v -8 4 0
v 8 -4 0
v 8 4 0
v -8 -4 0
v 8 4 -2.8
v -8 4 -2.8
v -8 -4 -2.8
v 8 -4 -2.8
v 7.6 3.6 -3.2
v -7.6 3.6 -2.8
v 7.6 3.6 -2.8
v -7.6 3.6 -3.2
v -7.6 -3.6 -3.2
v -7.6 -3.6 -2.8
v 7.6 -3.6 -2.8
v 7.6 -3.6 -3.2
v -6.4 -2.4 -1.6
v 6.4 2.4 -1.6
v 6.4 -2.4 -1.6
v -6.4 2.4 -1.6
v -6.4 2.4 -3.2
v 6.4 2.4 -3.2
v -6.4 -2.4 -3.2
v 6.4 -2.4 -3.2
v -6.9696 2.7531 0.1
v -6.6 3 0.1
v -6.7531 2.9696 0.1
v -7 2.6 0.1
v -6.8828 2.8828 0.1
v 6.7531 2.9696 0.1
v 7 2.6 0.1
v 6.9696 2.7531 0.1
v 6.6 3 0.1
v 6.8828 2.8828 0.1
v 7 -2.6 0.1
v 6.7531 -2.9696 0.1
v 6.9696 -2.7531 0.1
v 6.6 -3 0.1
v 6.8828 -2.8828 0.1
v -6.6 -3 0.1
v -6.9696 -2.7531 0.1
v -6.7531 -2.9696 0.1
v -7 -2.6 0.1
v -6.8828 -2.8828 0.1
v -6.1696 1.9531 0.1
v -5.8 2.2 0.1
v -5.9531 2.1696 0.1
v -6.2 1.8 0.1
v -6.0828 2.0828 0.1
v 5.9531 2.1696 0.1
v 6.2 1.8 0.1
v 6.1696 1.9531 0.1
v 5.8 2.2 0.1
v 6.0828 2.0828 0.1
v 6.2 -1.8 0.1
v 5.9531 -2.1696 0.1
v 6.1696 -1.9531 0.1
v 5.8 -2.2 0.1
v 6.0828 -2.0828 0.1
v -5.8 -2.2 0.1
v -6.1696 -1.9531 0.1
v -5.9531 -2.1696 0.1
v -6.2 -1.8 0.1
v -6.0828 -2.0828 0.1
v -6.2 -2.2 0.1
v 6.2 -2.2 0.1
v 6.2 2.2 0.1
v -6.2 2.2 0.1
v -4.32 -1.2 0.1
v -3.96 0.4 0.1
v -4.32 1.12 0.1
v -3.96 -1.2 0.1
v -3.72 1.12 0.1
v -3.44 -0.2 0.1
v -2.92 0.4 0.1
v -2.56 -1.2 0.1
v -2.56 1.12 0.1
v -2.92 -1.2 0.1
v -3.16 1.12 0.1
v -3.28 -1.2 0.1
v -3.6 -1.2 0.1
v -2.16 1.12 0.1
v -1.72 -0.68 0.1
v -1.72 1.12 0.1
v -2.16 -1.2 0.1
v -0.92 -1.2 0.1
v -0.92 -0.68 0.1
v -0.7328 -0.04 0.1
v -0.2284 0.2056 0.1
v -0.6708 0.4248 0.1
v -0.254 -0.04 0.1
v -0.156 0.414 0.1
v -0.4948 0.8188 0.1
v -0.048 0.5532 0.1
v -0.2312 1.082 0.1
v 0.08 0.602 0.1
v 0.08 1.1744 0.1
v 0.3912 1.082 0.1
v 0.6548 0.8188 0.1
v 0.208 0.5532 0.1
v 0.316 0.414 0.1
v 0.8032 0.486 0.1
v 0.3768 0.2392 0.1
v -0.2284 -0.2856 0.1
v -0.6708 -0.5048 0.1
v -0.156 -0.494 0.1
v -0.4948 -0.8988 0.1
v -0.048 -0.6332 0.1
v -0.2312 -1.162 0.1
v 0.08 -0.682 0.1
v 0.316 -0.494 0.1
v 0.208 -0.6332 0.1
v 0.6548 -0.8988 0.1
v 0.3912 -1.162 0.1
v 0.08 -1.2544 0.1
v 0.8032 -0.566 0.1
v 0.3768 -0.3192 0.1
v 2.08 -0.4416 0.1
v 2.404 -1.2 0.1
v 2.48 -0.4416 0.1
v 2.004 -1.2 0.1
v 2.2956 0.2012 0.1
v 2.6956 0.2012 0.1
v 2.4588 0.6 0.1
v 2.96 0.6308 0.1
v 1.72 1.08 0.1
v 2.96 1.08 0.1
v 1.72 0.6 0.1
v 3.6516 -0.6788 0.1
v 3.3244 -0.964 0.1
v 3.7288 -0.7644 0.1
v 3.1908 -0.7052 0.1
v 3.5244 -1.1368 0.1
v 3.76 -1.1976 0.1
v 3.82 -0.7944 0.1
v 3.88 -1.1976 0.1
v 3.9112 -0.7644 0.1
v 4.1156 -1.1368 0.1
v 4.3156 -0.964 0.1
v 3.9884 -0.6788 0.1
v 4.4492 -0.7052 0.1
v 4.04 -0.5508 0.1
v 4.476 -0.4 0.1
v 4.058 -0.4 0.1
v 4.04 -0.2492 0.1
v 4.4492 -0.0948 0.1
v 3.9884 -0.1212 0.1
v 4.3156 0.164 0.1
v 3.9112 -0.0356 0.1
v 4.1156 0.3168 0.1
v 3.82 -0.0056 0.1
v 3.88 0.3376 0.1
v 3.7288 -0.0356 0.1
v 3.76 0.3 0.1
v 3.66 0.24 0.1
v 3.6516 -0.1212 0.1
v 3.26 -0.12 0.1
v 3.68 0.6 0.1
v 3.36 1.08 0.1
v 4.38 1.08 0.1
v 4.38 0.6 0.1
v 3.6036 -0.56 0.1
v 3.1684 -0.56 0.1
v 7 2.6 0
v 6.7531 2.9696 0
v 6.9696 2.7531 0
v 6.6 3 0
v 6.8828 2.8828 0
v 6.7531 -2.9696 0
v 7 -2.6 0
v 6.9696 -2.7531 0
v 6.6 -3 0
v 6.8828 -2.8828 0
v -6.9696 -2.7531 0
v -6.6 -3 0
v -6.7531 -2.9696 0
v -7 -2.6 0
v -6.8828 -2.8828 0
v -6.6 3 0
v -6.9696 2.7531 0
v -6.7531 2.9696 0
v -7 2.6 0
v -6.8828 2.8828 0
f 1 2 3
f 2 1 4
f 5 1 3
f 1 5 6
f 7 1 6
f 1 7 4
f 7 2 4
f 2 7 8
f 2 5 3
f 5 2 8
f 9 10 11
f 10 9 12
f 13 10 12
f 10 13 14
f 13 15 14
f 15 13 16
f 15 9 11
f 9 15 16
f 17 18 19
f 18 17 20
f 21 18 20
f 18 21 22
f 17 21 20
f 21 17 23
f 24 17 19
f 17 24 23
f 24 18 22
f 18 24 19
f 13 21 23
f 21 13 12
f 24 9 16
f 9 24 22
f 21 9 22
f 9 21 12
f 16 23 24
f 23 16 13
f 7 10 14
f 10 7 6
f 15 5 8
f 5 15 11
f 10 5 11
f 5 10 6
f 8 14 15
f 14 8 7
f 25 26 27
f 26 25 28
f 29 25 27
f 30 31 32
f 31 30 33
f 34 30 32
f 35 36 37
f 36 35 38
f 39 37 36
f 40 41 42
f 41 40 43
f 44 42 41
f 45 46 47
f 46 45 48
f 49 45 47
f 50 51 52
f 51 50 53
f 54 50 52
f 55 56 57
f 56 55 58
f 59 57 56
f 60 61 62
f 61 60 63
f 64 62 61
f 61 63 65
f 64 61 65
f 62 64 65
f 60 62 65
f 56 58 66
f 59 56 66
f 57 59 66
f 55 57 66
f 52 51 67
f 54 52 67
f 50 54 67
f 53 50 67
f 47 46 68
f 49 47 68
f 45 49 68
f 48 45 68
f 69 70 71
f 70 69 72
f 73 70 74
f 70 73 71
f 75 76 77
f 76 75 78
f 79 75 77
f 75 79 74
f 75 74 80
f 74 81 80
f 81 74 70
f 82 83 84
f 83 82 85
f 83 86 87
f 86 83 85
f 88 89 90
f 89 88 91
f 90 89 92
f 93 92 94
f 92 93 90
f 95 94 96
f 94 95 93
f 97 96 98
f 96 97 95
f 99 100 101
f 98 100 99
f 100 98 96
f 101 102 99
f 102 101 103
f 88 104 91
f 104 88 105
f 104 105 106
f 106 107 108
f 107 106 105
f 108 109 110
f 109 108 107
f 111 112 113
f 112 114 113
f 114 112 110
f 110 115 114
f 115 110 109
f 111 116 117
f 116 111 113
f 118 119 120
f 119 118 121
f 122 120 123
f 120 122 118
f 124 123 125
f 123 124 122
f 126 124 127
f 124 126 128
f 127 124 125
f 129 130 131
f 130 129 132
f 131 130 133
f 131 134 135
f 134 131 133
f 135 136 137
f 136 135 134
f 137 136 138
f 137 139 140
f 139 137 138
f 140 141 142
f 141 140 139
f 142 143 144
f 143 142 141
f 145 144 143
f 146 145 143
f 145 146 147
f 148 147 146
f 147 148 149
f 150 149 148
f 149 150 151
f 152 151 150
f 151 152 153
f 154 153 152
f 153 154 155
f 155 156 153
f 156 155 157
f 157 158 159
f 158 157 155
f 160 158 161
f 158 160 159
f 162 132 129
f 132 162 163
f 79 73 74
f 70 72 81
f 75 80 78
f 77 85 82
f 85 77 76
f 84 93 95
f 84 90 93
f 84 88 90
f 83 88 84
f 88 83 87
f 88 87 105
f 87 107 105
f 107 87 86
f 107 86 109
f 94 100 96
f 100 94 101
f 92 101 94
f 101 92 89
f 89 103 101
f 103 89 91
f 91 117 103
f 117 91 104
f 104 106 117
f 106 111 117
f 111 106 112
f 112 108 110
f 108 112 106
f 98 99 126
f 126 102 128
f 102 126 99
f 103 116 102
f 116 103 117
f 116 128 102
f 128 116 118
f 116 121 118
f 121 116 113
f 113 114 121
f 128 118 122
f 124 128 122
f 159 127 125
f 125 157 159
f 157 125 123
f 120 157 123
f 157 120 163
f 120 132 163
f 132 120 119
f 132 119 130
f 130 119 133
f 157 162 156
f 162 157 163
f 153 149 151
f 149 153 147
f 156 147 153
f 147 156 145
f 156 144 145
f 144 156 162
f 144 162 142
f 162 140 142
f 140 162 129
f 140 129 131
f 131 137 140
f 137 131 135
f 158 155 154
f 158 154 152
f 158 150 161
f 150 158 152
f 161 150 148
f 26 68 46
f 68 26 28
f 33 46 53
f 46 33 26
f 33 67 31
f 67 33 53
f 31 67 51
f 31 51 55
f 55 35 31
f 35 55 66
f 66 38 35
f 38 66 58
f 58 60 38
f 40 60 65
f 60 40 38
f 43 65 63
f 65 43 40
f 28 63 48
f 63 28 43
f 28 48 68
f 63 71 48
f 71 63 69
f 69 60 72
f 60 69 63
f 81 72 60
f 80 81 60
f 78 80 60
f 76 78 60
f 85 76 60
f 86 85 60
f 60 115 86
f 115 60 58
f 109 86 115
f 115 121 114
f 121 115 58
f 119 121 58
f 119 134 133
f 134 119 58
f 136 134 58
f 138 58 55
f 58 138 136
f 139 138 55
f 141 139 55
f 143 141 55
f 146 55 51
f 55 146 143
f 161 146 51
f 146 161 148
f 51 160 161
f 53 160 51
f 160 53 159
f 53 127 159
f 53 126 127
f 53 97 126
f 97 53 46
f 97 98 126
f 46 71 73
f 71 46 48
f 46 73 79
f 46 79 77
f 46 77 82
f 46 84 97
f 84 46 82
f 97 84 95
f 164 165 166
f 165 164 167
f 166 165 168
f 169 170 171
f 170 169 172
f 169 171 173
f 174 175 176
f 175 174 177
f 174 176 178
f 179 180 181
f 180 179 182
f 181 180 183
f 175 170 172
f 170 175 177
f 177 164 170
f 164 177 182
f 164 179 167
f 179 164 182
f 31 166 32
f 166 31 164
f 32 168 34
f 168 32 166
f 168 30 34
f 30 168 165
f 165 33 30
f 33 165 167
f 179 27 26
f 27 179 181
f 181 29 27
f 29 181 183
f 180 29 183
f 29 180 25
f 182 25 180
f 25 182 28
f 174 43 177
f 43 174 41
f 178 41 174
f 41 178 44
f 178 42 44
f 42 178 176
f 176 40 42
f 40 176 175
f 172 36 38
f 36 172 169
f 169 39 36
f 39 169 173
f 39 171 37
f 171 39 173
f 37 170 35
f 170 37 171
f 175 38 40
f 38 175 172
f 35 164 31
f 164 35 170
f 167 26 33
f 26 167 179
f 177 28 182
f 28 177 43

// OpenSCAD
// file: ../p/box5.scad
use <../lib.scad>
function ldraw_lib__box5() = [
// 0 Box with 5 Faces and All Edges
// 0 Name: box5.dat
// 0 Author: James Jessiman
// 0 !LDRAW_ORG Primitive UPDATE 2012-01
// 0 !LICENSE Licensed under CC BY 4.0 : see CAreadme.txt
// 
// 0 BFC CERTIFY CCW
  [0,"BFC","CERTIFY"],
  [0,"BFC","CCW"],
// 
// 0 !HISTORY 2002-04-03 [sbliss] Modified for BFC compliance
// 0 !HISTORY 2002-04-25 [PTadmin] Official Update 2002-02
// 0 !HISTORY 2007-06-24 [PTadmin] Header formatted for Contributor Agreement
// 0 !HISTORY 2008-07-01 [PTadmin] Official Update 2008-01
// 0 !HISTORY 2012-02-16 [Philo] Changed to CCW
// 0 !HISTORY 2012-03-30 [PTadmin] Official Update 2012-01
// 
// 
// 2 24 1 1 1 -1 1 1
  [2,24,1,1,1,-1,1,1],
// 2 24 -1 1 1 -1 1 -1
  [2,24,-1,1,1,-1,1,-1],
// 2 24 -1 1 -1 1 1 -1
  [2,24,-1,1,-1,1,1,-1],
// 2 24 1 1 -1 1 1 1
  [2,24,1,1,-1,1,1,1],
// 2 24 1 0 1 -1 0 1
  [2,24,1,0,1,-1,0,1],
// 2 24 -1 0 1 -1 0 -1
  [2,24,-1,0,1,-1,0,-1],
// 2 24 -1 0 -1 1 0 -1
  [2,24,-1,0,-1,1,0,-1],
// 2 24 1 0 -1 1 0 1
  [2,24,1,0,-1,1,0,1],
// 2 24 1 0 1 1 1 1
  [2,24,1,0,1,1,1,1],
// 2 24 -1 0 1 -1 1 1
  [2,24,-1,0,1,-1,1,1],
// 2 24 1 0 -1 1 1 -1
  [2,24,1,0,-1,1,1,-1],
// 2 24 -1 0 -1 -1 1 -1
  [2,24,-1,0,-1,-1,1,-1],
// 4 16 -1 1 1 1 1 1 1 1 -1 -1 1 -1
  [4,16,-1,1,1,1,1,1,1,1,-1,-1,1,-1],
// 4 16 -1 1 1 -1 0 1 1 0 1 1 1 1
  [4,16,-1,1,1,-1,0,1,1,0,1,1,1,1],
// 4 16 -1 1 -1 -1 0 -1 -1 0 1 -1 1 1
  [4,16,-1,1,-1,-1,0,-1,-1,0,1,-1,1,1],
// 4 16 1 1 -1 1 0 -1 -1 0 -1 -1 1 -1
  [4,16,1,1,-1,1,0,-1,-1,0,-1,-1,1,-1],
// 4 16 1 1 1 1 0 1 1 0 -1 1 1 -1
  [4,16,1,1,1,1,0,1,1,0,-1,1,1,-1],
];
module ldraw_lib__box5(step=0, col=false, unit=2/5, alt=false, line=0.2, solid=!$preview)
    makepoly(ldraw_lib__box5(), step=step, col=col, unit=unit, alt=alt, line=line, solid=solid);
ldraw_lib__box5(line=0.2);
// file: ../p/box4.scad
use <../lib.scad>
function ldraw_lib__box4() = [
// 0 Box with 4 Faces (2 Parallel Pairs) and All Edges
// 0 Name: box4.dat
// 0 Author: James Jessiman
// 0 !LDRAW_ORG Primitive UPDATE 2012-01
// 0 !LICENSE Licensed under CC BY 4.0 : see CAreadme.txt
// 
// 0 BFC CERTIFY CCW
  [0,"BFC","CERTIFY"],
  [0,"BFC","CCW"],
// 
// 0 !HISTORY 2002-04-03 [sbliss] Modified for BFC compliance
// 0 !HISTORY 2002-04-25 [PTadmin] Official Update 2002-02
// 0 !HISTORY 2007-06-24 [PTadmin] Header formatted for Contributor Agreement
// 0 !HISTORY 2008-07-01 [PTadmin] Official Update 2008-01
// 0 !HISTORY 2012-02-16 [Philo] Changed to CCW
// 0 !HISTORY 2012-03-30 [PTadmin] Official Update 2012-01
// 
// 
// 2 24 1 1 1 -1 1 1
  [2,24,1,1,1,-1,1,1],
// 2 24 -1 1 1 -1 1 -1
  [2,24,-1,1,1,-1,1,-1],
// 2 24 -1 1 -1 1 1 -1
  [2,24,-1,1,-1,1,1,-1],
// 2 24 1 1 -1 1 1 1
  [2,24,1,1,-1,1,1,1],
// 2 24 1 0 1 -1 0 1
  [2,24,1,0,1,-1,0,1],
// 2 24 -1 0 1 -1 0 -1
  [2,24,-1,0,1,-1,0,-1],
// 2 24 -1 0 -1 1 0 -1
  [2,24,-1,0,-1,1,0,-1],
// 2 24 1 0 -1 1 0 1
  [2,24,1,0,-1,1,0,1],
// 2 24 1 0 1 1 1 1
  [2,24,1,0,1,1,1,1],
// 2 24 -1 0 1 -1 1 1
  [2,24,-1,0,1,-1,1,1],
// 2 24 1 0 -1 1 1 -1
  [2,24,1,0,-1,1,1,-1],
// 2 24 -1 0 -1 -1 1 -1
  [2,24,-1,0,-1,-1,1,-1],
// 4 16 -1 1 1 -1 0 1 1 0 1 1 1 1
  [4,16,-1,1,1,-1,0,1,1,0,1,1,1,1],
// 4 16 -1 1 -1 -1 0 -1 -1 0 1 -1 1 1
  [4,16,-1,1,-1,-1,0,-1,-1,0,1,-1,1,1],
// 4 16 1 1 -1 1 0 -1 -1 0 -1 -1 1 -1
  [4,16,1,1,-1,1,0,-1,-1,0,-1,-1,1,-1],
// 4 16 1 1 1 1 0 1 1 0 -1 1 1 -1
  [4,16,1,1,1,1,0,1,1,0,-1,1,1,-1],
];
module ldraw_lib__box4(step=0, col=false, unit=2/5, alt=false, line=0.2, solid=!$preview)
    makepoly(ldraw_lib__box4(), step=step, col=col, unit=unit, alt=alt, line=line, solid=solid);
ldraw_lib__box4(line=0.2);
// file: ../p/1-4ndis.scad
use <../lib.scad>
function ldraw_lib__1_4ndis() = [
// 0 Disc Negative 0.25
// 0 Name: 1-4ndis.dat
// 0 Author: James Jessiman
// 0 !LDRAW_ORG Primitive UPDATE 2012-01
// 0 !LICENSE Licensed under CC BY 4.0 : see CAreadme.txt
// 
// 0 BFC CERTIFY CCW
  [0,"BFC","CERTIFY"],
  [0,"BFC","CCW"],
// 
// 0 !HISTORY 2002-03-23 [sbliss] Added BFC Statement
// 0 !HISTORY 2002-04-25 [PTadmin] Official Update 2002-02
// 0 !HISTORY 2007-06-22 [PTadmin] Header formatted for Contributor Agreement
// 0 !HISTORY 2008-07-01 [PTadmin] Official Update 2008-01
// 0 !HISTORY 2012-02-16 [Philo] Changed to CCW
// 0 !HISTORY 2012-03-30 [PTadmin] Official Update 2012-01
// 
// 
// 3 16 0.9239 0 0.3827 1 0 0 1 0 1
  [3,16,0.9239,0,0.3827,1,0,0,1,0,1],
// 3 16 0.7071 0 0.7071 0.9239 0 0.3827 1 0 1
  [3,16,0.7071,0,0.7071,0.9239,0,0.3827,1,0,1],
// 3 16 0.3827 0 0.9239 0.7071 0 0.7071 1 0 1
  [3,16,0.3827,0,0.9239,0.7071,0,0.7071,1,0,1],
// 3 16 0 0 1 0.3827 0 0.9239 1 0 1
  [3,16,0,0,1,0.3827,0,0.9239,1,0,1],
];
module ldraw_lib__1_4ndis(step=0, col=false, unit=2/5, alt=false, line=0.2, solid=!$preview)
    makepoly(ldraw_lib__1_4ndis(), step=step, col=col, unit=unit, alt=alt, line=line, solid=solid);
ldraw_lib__1_4ndis(line=0.2);
// file: ../p/1-4cyli.scad
use <../lib.scad>
function ldraw_lib__1_4cyli() = [
// 0 Cylinder 0.25
// 0 Name: 1-4cyli.dat
// 0 Author: James Jessiman
// 0 !LDRAW_ORG Primitive UPDATE 2012-01
// 0 !LICENSE Licensed under CC BY 4.0 : see CAreadme.txt
// 
// 0 BFC CERTIFY CCW
  [0,"BFC","CERTIFY"],
  [0,"BFC","CCW"],
// 
// 0 !HISTORY 2002-03-23 [sbliss] Added BFC statement.
// 0 !HISTORY 2002-04-25 [PTadmin] Official Update 2002-02
// 0 !HISTORY 2007-06-22 [PTadmin] Header formatted for Contributor Agreement
// 0 !HISTORY 2008-07-01 [PTadmin] Official Update 2008-01
// 0 !HISTORY 2012-02-16 [Philo] Changed to CCW
// 0 !HISTORY 2012-03-30 [PTadmin] Official Update 2012-01
// 
// 
// 4 16 1 1 0 0.9239 1 0.3827 0.9239 0 0.3827 1 0 0
  [4,16,1,1,0,0.9239,1,0.3827,0.9239,0,0.3827,1,0,0],
// 5 24 1 0 0 1 1 0 0.9239 0 0.3827 1 0 -1
  [5,24,1,0,0,1,1,0,0.9239,0,0.3827,1,0,-1],
// 4 16 0.9239 1 0.3827 0.7071 1 0.7071 0.7071 0 0.7071 0.9239 0 0.3827
  [4,16,0.9239,1,0.3827,0.7071,1,0.7071,0.7071,0,0.7071,0.9239,0,0.3827],
// 5 24 0.9239 0 0.3827 0.9239 1 0.3827 0.7071 0 0.7071 1 0 0
  [5,24,0.9239,0,0.3827,0.9239,1,0.3827,0.7071,0,0.7071,1,0,0],
// 4 16 0.7071 1 0.7071 0.3827 1 0.9239 0.3827 0 0.9239 0.7071 0 0.7071
  [4,16,0.7071,1,0.7071,0.3827,1,0.9239,0.3827,0,0.9239,0.7071,0,0.7071],
// 5 24 0.7071 0 0.7071 0.7071 1 0.7071 0.3827 0 0.9239 0.9239 0 0.3827
  [5,24,0.7071,0,0.7071,0.7071,1,0.7071,0.3827,0,0.9239,0.9239,0,0.3827],
// 4 16 0.3827 1 0.9239 0 1 1 0 0 1 0.3827 0 0.9239
  [4,16,0.3827,1,0.9239,0,1,1,0,0,1,0.3827,0,0.9239],
// 5 24 0.3827 0 0.9239 0.3827 1 0.9239 0 0 1 0.7071 0 0.7071
  [5,24,0.3827,0,0.9239,0.3827,1,0.9239,0,0,1,0.7071,0,0.7071],
// 5 24 0 0 1 0 1 1 0.3827 0 0.9239 -1 0 1
  [5,24,0,0,1,0,1,1,0.3827,0,0.9239,-1,0,1],
];
module ldraw_lib__1_4cyli(step=0, col=false, unit=2/5, alt=false, line=0.2, solid=!$preview)
    makepoly(ldraw_lib__1_4cyli(), step=step, col=col, unit=unit, alt=alt, line=line, solid=solid);
ldraw_lib__1_4cyli(line=0.2);
// file: ../p/1-4chrd.scad
use <../lib.scad>
function ldraw_lib__1_4chrd() = [
// 0 Chord 0.25
// 0 Name: 1-4chrd.dat
// 0 Author: Max Martin Richter [MMR1988]
// 0 !LDRAW_ORG Primitive UPDATE 2023-05
// 0 !LICENSE Licensed under CC BY 4.0 : see CAreadme.txt
// 
// 0 BFC CERTIFY CCW
  [0,"BFC","CERTIFY"],
  [0,"BFC","CCW"],
// 
// 0 !HISTORY 2004-04-22 [PTadmin] Official Update 2004-02
// 0 !HISTORY 2007-10-09 [PTadmin] Header formatted for Contributor Agreement
// 0 !HISTORY 2008-07-01 [PTadmin] Official Update 2008-01
// 0 !HISTORY 2012-08-02 [MMR1988] Re-creation with PrimGen2 and Rectifier
// 0 !HISTORY 2012-08-09 [PTadmin] Official Update 2012-02
// 0 !HISTORY 2023-10-27 [OrionP] Change author to MMR1988 from hafhead
// 0 !HISTORY 2023-10-31 [OrionP] Official Update 2023-05
// 
// 4 16 0.9239 0 0.3827 0.3827 0 0.9239 0 0 1 1 0 0
  [4,16,0.9239,0,0.3827,0.3827,0,0.9239,0,0,1,1,0,0],
// 3 16 0.7071 0 0.7071 0.3827 0 0.9239 0.9239 0 0.3827
  [3,16,0.7071,0,0.7071,0.3827,0,0.9239,0.9239,0,0.3827],
];
module ldraw_lib__1_4chrd(step=0, col=false, unit=2/5, alt=false, line=0.2, solid=!$preview)
    makepoly(ldraw_lib__1_4chrd(), step=step, col=col, unit=unit, alt=alt, line=line, solid=solid);
ldraw_lib__1_4chrd(line=0.2);
// file: s/3069bs01.scad
use <../../lib.scad>
use <../../p/box4.scad>
use <../../p/box5.scad>
function ldraw_lib__s__3069bs01() = [
// 0 ~Tile  1 x  2 with Groove without Top Face
// 0 Name: s\3069bs01.dat
// 0 Author: Santeri Piippo [arezey]
// 0 !LDRAW_ORG Subpart UPDATE 2010-02
// 0 !LICENSE Licensed under CC BY 4.0 : see CAreadme.txt
// 
// 0 BFC CERTIFY CCW
  [0,"BFC","CERTIFY"],
  [0,"BFC","CCW"],
// 
// 0 !HISTORY 2010-07-05 [PTadmin] Official Update 2010-02
// 
// 
// 1 16 0 0 0 20 0 0 0 7 0 0 0 10 box4.dat
  [1,16,0,0,0,20,0,0,0,7,0,0,0,10, ldraw_lib__box4()],
// 1 16 0 7 0 19 0 0 0 1 0 0 0 9 box4.dat
  [1,16,0,7,0,19,0,0,0,1,0,0,0,9, ldraw_lib__box4()],
// 0 BFC INVERTNEXT
  [0,"BFC","INVERTNEXT"],
// 1 16 0 8 0 16 0 0 0 -4 0 0 0 6 box5.dat
  [1,16,0,8,0,16,0,0,0,-4,0,0,0,6, ldraw_lib__box5()],
// 4 16 -19 8 9 -16 8 6 -16 8 -6 -19 8 -9
  [4,16,-19,8,9,-16,8,6,-16,8,-6,-19,8,-9],
// 4 16 19 8 -9 16 8 -6 16 8 6 19 8 9
  [4,16,19,8,-9,16,8,-6,16,8,6,19,8,9],
// 4 16 19 8 9 16 8 6 -16 8 6 -19 8 9
  [4,16,19,8,9,16,8,6,-16,8,6,-19,8,9],
// 4 16 -19 8 -9 -16 8 -6 16 8 -6 19 8 -9
  [4,16,-19,8,-9,-16,8,-6,16,8,-6,19,8,-9],
// 4 16 -20 7 10 -19 7 9 -19 7 -9 -20 7 -10
  [4,16,-20,7,10,-19,7,9,-19,7,-9,-20,7,-10],
// 4 16 20 7 -10 19 7 -9 19 7 9 20 7 10
  [4,16,20,7,-10,19,7,-9,19,7,9,20,7,10],
// 4 16 20 7 10 19 7 9 -19 7 9 -20 7 10
  [4,16,20,7,10,19,7,9,-19,7,9,-20,7,10],
// 4 16 -20 7 -10 -19 7 -9 19 7 -9 20 7 -10
  [4,16,-20,7,-10,-19,7,-9,19,7,-9,20,7,-10],
// 0 //
];
module ldraw_lib__s__3069bs01(step=0, col=false, unit=2/5, alt=false, line=0.2, solid=!$preview)
    makepoly(ldraw_lib__s__3069bs01(), step=step, col=col, unit=unit, alt=alt, line=line, solid=solid);
ldraw_lib__s__3069bs01(line=0.2);
// file: 3069b.scad
use <../lib.scad>
use <s/3069bs01.scad>
function ldraw_lib__3069b() = [
// 0 Tile  1 x  2 with Groove
// 0 Name: 3069b.dat
// 0 Author: Santeri Piippo [arezey]
// 0 !LDRAW_ORG Part UPDATE 2010-02
// 0 !LICENSE Licensed under CC BY 4.0 : see CAreadme.txt
// 
// 0 BFC CERTIFY CCW
  [0,"BFC","CERTIFY"],
  [0,"BFC","CCW"],
// 
// 0 !HISTORY 2010-07-05 [PTadmin] Official Update 2010-02
// 
// 
// 4 16 20 0 -10 20 0 10 -20 0 10 -20 0 -10
  [4,16,20,0,-10,20,0,10,-20,0,10,-20,0,-10],
// 1 16 0 0 0 1 0 0 0 1 0 0 0 1 s\3069bs01.dat
  [1,16,0,0,0,1,0,0,0,1,0,0,0,1, ldraw_lib__s__3069bs01()],
// 0 //
];
module ldraw_lib__3069b(step=0, col=false, unit=2/5, alt=false, line=0.2, solid=!$preview)
    makepoly(ldraw_lib__3069b(), step=step, col=col, unit=unit, alt=alt, line=line, solid=solid);
ldraw_lib__3069b(line=0.2);
// main file
use <../lib.scad>
use <3069b.scad>
use <6152075a.scad>
function ldraw_lib__3069bd0i() = [
// 0 Tile  1 x  2 with Black "MLC 75" and Black Border Sticker
// 0 Name: 3069bd0i.dat
// 0 Author: Evert-Jan Boer [ejboer]
// 0 !LDRAW_ORG Shortcut UPDATE 2024-08
// 0 !LICENSE Licensed under CC BY 4.0 : see CAreadme.txt
// 
// 0 BFC CERTIFY CCW
  [0,"BFC","CERTIFY"],
  [0,"BFC","CCW"],
// 
// 0 !CATEGORY Sticker Shortcut
// 0 !KEYWORDS Bricklink 3069pb0577, London Mini Bus, Set 40220
// 
// 0 !HISTORY 2024-09-30 [OrionP] Official Update 2024-08
// 
// 1 16 0 0 0 1 0 0 0 1 0 0 0 1 3069b.dat
  [1,16,0,0,0,1,0,0,0,1,0,0,0,1, ldraw_lib__3069b()],
// 1 16 0 0 0 1 0 0 0 1 0 0 0 1 6152075a.dat
  [1,16,0,0,0,1,0,0,0,1,0,0,0,1, ldraw_lib__6152075a()],
];
module ldraw_lib__3069bd0i(step=0, col=false, unit=2/5, alt=false, line=0.2, solid=!$preview)
    makepoly(ldraw_lib__3069bd0i(), step=step, col=col, unit=unit, alt=alt, line=line, solid=solid);
ldraw_lib__3069bd0i(line=0.2);
